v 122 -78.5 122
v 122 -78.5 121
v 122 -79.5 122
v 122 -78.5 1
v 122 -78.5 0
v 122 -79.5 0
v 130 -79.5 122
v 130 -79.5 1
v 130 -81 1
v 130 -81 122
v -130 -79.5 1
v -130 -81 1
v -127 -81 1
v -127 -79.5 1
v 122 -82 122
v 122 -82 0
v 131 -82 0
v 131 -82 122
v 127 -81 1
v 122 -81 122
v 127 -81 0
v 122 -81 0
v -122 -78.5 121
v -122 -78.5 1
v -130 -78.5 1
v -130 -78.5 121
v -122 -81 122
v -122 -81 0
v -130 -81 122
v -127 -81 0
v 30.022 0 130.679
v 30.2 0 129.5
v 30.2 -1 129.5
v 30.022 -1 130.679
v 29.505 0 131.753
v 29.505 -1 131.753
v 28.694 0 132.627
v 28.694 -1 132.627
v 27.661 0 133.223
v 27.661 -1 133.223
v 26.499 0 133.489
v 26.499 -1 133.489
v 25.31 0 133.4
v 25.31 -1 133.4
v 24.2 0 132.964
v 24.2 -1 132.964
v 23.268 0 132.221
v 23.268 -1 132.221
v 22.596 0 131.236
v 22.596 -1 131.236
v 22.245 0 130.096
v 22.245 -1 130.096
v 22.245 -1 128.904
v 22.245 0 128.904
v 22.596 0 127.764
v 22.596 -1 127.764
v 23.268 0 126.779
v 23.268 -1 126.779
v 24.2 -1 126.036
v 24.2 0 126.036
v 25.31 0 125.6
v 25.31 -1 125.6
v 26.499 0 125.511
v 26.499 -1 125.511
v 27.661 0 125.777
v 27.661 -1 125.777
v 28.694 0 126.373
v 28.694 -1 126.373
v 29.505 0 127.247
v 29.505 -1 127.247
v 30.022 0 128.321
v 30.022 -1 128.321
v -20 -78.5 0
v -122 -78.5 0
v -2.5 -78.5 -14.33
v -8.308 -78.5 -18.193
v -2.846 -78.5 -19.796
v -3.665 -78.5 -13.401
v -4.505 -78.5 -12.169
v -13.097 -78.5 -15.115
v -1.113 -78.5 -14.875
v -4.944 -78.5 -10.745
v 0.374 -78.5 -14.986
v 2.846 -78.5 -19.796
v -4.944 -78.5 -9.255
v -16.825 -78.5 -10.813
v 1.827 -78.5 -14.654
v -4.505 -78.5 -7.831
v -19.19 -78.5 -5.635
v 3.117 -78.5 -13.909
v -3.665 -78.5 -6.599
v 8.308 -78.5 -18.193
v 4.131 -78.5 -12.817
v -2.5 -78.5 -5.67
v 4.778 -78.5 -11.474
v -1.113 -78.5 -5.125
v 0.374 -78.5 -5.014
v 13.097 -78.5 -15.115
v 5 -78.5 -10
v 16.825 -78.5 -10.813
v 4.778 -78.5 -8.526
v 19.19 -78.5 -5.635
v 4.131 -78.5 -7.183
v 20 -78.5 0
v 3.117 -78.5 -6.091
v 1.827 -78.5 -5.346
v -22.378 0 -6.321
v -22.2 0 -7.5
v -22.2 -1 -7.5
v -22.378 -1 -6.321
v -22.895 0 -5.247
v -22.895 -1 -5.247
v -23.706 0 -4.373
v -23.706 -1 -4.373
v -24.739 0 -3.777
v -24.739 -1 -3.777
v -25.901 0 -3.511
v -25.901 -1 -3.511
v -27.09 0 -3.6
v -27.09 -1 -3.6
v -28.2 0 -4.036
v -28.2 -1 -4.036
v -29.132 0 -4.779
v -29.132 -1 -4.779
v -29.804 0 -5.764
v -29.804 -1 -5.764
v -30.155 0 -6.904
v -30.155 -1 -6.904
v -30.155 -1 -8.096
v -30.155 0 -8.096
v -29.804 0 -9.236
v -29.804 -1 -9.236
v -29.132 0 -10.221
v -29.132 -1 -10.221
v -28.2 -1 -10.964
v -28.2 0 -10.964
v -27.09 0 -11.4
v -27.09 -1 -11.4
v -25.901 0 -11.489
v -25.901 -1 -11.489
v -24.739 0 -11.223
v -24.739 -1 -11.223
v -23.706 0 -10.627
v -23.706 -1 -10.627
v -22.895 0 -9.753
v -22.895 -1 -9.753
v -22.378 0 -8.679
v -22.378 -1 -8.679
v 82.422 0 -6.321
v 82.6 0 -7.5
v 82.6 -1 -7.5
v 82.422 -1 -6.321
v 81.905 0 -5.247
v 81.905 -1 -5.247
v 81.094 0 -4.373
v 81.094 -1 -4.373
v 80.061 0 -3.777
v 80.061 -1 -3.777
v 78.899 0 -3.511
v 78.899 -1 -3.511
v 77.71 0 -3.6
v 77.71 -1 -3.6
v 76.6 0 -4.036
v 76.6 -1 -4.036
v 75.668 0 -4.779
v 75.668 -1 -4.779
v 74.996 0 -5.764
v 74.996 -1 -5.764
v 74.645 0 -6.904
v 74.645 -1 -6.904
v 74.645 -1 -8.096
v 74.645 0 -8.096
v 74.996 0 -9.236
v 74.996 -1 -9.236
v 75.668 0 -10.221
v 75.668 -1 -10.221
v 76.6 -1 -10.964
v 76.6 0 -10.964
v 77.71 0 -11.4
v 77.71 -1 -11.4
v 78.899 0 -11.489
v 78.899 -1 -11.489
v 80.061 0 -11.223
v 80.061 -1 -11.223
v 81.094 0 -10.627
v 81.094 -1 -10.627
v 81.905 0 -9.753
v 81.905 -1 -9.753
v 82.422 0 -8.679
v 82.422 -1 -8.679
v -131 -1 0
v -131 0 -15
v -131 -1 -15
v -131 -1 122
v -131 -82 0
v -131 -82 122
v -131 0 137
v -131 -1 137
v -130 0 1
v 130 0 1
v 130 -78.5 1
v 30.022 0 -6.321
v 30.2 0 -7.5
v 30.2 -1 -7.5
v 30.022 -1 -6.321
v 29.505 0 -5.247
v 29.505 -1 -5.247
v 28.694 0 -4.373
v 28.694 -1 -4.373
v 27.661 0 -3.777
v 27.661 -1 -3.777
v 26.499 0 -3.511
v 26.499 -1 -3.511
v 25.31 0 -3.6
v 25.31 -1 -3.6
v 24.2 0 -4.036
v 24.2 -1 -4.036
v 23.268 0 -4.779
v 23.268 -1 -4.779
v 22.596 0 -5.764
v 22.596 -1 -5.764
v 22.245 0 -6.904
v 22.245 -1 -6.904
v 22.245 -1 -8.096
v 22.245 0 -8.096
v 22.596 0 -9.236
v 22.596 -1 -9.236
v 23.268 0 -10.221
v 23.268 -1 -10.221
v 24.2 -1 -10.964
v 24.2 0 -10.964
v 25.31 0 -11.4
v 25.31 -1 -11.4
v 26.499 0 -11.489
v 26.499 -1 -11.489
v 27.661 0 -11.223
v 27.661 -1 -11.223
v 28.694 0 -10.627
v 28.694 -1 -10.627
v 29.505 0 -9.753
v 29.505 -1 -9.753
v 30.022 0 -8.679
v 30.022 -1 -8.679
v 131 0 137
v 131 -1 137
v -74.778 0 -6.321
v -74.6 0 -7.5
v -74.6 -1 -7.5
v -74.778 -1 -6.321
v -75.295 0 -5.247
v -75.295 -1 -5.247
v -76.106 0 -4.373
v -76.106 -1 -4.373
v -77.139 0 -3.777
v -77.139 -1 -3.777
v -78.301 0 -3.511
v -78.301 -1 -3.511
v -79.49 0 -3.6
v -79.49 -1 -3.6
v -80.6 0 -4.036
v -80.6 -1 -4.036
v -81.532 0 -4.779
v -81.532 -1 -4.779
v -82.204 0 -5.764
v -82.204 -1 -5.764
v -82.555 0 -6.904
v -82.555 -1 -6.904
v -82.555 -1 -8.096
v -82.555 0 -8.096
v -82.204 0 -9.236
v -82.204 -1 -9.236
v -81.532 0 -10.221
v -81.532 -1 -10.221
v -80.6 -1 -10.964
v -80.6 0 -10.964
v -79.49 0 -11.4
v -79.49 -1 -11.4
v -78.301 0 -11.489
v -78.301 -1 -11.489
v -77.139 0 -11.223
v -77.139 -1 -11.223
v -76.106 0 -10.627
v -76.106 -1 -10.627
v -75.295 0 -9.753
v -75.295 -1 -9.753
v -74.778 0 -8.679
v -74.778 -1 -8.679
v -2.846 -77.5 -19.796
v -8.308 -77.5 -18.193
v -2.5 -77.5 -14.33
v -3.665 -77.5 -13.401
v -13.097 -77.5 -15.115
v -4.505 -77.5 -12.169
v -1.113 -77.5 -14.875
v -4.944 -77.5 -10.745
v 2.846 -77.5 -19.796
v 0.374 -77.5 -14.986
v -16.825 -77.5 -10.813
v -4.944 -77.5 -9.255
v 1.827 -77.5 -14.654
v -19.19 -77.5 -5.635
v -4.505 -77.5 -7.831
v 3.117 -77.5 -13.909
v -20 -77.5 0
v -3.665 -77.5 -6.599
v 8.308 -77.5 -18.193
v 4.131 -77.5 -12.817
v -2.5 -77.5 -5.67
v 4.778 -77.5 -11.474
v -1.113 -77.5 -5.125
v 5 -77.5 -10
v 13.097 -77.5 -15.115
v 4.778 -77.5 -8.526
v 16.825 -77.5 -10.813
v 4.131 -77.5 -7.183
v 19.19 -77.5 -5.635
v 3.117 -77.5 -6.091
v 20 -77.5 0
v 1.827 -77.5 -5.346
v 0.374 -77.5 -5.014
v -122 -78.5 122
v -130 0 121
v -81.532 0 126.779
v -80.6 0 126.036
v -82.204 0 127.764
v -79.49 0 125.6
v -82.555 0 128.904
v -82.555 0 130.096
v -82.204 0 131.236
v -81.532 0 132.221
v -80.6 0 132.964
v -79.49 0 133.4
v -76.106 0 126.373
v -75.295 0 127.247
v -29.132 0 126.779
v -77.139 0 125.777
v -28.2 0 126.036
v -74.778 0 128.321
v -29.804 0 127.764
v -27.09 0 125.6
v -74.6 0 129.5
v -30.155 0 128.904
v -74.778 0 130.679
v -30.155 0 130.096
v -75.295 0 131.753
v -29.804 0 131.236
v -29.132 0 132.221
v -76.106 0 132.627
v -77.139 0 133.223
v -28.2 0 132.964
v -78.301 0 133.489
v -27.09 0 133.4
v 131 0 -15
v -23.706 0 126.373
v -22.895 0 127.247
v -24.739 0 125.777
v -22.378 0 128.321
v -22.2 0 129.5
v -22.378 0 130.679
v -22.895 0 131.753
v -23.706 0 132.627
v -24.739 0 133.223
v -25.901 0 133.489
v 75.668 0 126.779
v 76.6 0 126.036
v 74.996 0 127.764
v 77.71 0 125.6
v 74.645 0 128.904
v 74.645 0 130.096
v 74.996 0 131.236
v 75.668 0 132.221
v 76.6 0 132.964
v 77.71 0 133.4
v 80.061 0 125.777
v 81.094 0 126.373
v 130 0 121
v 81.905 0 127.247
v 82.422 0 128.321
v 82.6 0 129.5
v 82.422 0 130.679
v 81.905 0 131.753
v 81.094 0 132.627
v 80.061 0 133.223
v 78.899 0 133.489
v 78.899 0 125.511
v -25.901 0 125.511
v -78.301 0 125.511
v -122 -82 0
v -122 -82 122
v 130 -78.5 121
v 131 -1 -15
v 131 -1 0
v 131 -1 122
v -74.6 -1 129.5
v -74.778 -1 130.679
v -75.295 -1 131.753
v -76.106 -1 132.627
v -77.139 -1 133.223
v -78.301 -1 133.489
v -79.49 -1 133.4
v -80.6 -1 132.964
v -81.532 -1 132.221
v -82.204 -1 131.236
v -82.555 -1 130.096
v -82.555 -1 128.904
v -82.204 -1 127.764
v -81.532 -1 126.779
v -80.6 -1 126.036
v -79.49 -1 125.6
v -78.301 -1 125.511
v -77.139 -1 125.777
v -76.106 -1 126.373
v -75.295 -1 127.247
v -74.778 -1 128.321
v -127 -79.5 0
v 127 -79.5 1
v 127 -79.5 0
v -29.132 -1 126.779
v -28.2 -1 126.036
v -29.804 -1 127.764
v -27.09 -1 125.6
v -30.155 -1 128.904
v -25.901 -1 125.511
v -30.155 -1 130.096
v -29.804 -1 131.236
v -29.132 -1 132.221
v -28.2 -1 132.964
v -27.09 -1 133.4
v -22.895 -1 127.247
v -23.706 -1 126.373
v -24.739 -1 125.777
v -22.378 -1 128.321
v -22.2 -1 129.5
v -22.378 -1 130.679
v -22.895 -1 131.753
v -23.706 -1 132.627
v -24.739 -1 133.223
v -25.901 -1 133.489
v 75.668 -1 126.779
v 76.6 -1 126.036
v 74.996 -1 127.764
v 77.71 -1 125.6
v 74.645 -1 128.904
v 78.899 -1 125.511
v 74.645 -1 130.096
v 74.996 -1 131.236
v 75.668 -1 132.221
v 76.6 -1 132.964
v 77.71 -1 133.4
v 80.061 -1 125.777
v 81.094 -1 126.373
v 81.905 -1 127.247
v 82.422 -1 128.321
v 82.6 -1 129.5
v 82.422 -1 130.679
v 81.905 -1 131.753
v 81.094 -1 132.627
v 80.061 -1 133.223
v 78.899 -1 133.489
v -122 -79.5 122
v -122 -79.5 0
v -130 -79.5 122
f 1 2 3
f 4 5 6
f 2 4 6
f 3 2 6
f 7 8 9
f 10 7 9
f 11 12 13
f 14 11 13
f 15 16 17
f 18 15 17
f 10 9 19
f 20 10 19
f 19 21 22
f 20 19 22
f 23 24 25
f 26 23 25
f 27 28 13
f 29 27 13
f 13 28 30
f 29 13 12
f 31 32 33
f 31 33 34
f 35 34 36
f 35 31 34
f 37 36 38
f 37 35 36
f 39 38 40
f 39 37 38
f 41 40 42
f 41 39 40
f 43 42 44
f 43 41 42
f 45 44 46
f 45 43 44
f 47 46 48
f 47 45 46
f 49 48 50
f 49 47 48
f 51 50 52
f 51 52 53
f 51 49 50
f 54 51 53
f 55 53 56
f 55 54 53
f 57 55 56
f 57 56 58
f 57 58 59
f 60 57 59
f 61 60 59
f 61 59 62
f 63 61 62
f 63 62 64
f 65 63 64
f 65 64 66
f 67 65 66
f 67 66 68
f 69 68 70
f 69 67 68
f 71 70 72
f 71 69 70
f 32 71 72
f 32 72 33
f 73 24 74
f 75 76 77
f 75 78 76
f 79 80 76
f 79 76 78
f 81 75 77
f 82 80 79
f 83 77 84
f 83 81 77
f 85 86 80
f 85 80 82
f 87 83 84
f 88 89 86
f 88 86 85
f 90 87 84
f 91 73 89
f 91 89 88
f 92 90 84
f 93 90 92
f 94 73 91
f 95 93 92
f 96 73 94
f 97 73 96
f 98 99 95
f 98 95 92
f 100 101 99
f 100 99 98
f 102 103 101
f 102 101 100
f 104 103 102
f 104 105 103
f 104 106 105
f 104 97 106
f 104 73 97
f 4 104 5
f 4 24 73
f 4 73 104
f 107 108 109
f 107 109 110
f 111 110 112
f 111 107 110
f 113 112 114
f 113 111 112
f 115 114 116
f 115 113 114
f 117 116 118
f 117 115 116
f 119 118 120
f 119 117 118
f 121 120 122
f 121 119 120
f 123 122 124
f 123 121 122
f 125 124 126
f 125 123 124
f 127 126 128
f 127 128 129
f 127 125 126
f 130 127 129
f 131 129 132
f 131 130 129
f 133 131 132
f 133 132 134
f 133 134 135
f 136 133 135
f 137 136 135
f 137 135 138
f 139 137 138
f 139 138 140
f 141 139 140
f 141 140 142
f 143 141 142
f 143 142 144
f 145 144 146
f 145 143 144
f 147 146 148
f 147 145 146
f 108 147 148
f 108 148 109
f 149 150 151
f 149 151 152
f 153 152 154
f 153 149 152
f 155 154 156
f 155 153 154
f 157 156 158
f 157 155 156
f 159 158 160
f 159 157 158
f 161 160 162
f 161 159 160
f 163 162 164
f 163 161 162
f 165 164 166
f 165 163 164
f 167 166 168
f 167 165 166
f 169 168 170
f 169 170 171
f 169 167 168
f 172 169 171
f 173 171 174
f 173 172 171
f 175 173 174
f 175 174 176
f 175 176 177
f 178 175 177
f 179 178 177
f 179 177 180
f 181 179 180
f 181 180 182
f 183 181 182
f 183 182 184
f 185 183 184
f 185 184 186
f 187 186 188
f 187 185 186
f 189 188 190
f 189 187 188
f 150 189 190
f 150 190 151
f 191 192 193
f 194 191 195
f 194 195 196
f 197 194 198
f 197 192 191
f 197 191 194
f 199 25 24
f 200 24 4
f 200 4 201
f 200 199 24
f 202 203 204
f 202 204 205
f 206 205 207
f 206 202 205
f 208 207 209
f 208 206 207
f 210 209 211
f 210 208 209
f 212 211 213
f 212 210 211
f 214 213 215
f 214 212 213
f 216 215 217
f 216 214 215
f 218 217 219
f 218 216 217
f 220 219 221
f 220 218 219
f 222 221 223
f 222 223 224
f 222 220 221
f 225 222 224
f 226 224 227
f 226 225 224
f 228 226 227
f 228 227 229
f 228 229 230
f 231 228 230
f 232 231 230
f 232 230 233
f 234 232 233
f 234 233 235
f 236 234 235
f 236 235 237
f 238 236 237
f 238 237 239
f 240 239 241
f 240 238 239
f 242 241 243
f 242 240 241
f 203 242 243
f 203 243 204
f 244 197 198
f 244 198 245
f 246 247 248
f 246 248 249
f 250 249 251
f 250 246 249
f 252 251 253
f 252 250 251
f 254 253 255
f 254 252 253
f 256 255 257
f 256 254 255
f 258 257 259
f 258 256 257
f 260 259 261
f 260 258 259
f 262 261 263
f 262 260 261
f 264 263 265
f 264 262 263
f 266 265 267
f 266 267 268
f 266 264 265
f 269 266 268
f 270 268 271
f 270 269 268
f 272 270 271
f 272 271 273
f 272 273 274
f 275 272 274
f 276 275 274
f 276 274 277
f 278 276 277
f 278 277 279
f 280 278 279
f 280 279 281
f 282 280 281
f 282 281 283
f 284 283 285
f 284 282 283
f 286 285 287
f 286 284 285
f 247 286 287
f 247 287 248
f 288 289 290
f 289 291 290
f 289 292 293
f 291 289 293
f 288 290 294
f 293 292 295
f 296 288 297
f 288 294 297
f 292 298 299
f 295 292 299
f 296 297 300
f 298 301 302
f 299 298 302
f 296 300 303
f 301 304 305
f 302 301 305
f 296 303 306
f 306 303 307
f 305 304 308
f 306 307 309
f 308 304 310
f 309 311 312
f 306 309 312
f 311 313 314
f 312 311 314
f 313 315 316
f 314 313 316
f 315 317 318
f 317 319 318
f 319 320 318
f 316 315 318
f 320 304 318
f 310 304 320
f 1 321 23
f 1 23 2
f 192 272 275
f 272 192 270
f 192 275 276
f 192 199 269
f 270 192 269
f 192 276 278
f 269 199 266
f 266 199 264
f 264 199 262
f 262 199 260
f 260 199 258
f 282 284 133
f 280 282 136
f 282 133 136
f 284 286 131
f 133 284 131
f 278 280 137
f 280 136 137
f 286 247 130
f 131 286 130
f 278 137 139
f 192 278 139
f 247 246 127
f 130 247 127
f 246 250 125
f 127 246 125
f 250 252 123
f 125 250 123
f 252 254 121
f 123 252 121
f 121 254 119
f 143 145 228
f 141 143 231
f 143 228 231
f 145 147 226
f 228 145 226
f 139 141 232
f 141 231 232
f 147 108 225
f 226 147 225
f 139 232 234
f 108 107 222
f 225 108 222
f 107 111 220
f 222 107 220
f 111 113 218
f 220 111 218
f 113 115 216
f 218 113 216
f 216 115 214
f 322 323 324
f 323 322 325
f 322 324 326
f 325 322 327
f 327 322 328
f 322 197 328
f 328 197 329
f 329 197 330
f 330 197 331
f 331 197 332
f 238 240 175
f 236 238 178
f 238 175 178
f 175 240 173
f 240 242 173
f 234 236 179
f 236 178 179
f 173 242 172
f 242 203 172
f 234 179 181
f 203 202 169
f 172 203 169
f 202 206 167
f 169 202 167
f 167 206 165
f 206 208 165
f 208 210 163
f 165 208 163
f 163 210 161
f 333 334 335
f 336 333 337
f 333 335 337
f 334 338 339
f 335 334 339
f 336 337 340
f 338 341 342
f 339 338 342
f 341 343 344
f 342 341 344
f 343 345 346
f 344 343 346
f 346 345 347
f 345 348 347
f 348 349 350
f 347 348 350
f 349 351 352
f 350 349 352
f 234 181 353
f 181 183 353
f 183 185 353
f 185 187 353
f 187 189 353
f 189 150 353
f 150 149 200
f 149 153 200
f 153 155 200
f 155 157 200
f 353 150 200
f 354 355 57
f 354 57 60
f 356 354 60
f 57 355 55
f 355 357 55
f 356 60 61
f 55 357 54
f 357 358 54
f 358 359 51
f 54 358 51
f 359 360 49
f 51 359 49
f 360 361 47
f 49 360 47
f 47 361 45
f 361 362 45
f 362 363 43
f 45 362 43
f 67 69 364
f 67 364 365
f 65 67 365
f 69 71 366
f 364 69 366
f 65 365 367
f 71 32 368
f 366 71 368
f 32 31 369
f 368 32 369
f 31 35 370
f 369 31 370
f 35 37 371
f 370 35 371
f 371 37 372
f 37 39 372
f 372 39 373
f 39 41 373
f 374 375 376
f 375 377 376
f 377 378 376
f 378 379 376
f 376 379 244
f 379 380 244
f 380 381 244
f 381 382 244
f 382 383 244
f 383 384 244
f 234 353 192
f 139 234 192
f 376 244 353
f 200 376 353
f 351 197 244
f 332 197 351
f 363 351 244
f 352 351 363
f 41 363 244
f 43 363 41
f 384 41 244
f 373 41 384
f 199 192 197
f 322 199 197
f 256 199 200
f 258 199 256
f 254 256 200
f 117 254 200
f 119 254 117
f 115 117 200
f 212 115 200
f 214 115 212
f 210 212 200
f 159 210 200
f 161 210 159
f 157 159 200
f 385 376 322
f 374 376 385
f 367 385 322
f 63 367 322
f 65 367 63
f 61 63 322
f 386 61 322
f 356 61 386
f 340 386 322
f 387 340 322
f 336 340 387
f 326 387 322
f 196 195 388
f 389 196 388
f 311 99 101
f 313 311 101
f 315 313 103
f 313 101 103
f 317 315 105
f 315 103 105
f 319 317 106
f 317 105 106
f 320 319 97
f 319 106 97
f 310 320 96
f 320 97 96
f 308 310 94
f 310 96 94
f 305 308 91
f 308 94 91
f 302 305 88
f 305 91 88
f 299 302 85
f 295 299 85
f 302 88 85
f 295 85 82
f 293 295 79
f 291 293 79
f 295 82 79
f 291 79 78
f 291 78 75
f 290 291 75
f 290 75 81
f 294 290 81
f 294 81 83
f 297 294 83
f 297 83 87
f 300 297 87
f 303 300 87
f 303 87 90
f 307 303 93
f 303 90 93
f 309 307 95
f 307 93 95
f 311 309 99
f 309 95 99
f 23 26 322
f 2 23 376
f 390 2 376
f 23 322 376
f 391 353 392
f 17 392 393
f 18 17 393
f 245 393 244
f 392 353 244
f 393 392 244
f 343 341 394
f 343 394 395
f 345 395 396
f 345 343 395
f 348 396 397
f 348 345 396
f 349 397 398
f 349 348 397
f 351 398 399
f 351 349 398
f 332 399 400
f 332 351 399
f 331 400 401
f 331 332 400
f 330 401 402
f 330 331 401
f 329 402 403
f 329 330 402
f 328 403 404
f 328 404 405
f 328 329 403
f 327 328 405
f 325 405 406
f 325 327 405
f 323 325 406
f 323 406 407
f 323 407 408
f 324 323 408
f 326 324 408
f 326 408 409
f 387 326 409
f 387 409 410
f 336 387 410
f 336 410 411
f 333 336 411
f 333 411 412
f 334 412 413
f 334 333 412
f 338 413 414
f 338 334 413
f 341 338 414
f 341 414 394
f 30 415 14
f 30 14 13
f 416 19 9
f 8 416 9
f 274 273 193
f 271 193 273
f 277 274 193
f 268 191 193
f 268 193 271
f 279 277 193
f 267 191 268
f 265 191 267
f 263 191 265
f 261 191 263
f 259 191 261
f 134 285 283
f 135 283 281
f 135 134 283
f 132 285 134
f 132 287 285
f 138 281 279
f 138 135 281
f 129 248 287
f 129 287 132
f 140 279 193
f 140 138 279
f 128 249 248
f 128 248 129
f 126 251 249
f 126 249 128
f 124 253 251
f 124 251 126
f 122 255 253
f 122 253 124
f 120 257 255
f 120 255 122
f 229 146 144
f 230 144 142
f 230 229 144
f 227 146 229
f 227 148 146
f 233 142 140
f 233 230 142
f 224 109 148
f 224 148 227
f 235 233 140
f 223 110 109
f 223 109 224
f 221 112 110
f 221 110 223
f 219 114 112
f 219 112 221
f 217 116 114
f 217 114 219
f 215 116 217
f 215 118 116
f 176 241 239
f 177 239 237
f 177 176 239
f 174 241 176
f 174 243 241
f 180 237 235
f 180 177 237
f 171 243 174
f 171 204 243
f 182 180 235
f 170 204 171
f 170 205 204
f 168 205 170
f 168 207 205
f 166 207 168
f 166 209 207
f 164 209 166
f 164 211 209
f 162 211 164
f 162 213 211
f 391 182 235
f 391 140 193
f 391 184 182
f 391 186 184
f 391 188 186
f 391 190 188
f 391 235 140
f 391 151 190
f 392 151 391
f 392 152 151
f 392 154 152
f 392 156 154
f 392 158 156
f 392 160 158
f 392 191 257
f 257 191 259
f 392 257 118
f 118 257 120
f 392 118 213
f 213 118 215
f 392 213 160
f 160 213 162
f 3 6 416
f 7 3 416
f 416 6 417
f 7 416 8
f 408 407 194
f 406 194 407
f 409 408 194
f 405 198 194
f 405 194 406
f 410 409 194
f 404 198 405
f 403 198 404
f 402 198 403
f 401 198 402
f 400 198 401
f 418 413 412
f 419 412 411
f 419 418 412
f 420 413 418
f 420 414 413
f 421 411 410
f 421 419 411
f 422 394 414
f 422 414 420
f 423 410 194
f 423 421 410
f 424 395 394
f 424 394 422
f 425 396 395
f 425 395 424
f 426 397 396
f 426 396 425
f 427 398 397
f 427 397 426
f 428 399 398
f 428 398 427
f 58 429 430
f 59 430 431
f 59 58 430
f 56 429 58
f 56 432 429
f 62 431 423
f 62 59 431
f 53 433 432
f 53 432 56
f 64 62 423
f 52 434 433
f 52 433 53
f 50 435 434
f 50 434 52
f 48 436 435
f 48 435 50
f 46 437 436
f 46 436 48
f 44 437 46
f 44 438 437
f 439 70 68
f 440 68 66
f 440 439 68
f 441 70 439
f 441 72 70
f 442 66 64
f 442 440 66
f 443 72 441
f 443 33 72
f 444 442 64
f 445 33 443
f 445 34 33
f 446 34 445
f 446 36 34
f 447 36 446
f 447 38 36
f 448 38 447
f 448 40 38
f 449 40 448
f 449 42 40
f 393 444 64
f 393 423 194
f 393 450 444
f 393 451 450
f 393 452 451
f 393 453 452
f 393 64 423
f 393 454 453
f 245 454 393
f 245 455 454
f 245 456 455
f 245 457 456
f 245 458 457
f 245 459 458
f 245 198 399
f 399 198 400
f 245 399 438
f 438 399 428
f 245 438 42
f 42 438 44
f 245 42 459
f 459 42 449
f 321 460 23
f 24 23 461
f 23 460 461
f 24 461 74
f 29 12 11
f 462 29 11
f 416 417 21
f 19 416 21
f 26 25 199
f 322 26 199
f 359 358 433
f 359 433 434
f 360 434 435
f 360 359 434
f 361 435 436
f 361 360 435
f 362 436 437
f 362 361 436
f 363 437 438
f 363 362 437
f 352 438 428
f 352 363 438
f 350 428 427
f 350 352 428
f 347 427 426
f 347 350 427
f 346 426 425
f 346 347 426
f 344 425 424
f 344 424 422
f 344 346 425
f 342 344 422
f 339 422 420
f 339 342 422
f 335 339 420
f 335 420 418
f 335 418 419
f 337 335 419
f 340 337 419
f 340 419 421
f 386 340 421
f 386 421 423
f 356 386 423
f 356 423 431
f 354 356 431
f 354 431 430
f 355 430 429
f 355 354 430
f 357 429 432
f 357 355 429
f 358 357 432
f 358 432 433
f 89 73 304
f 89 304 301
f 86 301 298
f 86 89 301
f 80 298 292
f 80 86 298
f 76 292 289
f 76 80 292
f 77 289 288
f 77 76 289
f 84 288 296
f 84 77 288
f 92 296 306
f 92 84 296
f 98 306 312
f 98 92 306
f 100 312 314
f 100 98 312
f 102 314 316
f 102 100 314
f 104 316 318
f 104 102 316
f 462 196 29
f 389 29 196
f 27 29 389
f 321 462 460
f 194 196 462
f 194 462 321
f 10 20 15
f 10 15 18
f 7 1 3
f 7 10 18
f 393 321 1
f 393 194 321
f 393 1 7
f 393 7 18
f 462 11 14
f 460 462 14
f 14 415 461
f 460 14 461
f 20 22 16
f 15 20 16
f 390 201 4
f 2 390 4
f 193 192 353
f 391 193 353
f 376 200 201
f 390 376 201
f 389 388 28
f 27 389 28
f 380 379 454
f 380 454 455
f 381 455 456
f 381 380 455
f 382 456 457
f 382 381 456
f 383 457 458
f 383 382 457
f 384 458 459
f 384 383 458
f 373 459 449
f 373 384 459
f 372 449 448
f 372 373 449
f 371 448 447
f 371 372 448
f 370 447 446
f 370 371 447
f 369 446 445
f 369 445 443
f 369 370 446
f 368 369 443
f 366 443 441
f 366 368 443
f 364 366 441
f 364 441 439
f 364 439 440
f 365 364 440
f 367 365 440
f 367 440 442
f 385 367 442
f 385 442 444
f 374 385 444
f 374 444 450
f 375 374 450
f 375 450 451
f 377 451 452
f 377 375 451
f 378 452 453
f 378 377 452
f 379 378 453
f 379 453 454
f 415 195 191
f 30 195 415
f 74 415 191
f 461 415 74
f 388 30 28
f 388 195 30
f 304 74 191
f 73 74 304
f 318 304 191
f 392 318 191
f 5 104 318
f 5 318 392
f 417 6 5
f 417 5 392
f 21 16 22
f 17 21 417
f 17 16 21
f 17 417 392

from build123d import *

# Parameters (mm, degrees)
F1_DEPTH = 122
F2_W     = 260
F2_H     = 1
F3_DEPTH = 78.5
F4_W     = 3
F4_H     = 1.5
F5_DEPTH = 1
F6_W     = 262
F6_H     = 15
F6_R     = 4
F7_DEPTH = 1
F8_R     = 5
F9_DEPTH = 1


with BuildPart() as f1:
    # F0 (on Top) → F1 (new body)
    with BuildSketch(Plane.XY):
        Polygon((-130, 0), (-131, 0), (-131, -82), (-122, -82), (-122, -81), (-130, -81), (-130, -79.5), (-122, -79.5), (-122, -78.5), (-130, -78.5), align=None)
    extrude(amount=F1_DEPTH)



with BuildPart() as f1b:
    # F0 (on Top) → F1, piece 2 (new body)
    with BuildSketch(Plane.XY):
        Polygon((131, -82), (131, 0), (130, 0), (130, -78.5), (122, -78.5), (122, -79.5), (130, -79.5), (130, -81), (122, -81), (122, -82), align=None)
    extrude(amount=F1_DEPTH)


with BuildPart() as f1_1:
    add(f1.part)

    add(f1b.part)  # F3 merges F1b
    # F2 (on Front) → F3 (join)
    with BuildSketch(Plane.XZ):
        with Locations((0, 0.5)):
            Rectangle(F2_W, F2_H)
        with Locations((0, 121.5)):
            Rectangle(F2_W, F2_H)
    extrude(amount=F3_DEPTH)

    # F4 (on face) → F5 (join)
    with BuildSketch(Plane(origin=(0, 0, 0), x_dir=(1, 0, 0), z_dir=(0, 0, -1))):
        with Locations((-128.5, 80.25)):
            Rectangle(F4_W, F4_H)
        with Locations((128.5, 80.25)):
            Rectangle(F4_W, F4_H)
    extrude(amount=-F5_DEPTH)

    # F6 (on Front) → F7 (join)
    with BuildSketch(Plane.XZ):
        with Locations((0, -7.5)):
            Rectangle(F6_W, F6_H)
        with Locations((-78.6, -7.5)):
            Circle(F6_R, mode=Mode.SUBTRACT)
        with Locations((-26.2, -7.5)):
            Circle(F6_R, mode=Mode.SUBTRACT)
        with Locations((26.2, -7.5)):
            Circle(F6_R, mode=Mode.SUBTRACT)
        with Locations((78.6, -7.5)):
            Circle(F6_R, mode=Mode.SUBTRACT)
        with Locations((0, 129.5)):
            Rectangle(F6_W, F6_H)
        with Locations((-78.6, 129.5)):
            Circle(F6_R, mode=Mode.SUBTRACT)
        with Locations((-26.2, 129.5)):
            Circle(F6_R, mode=Mode.SUBTRACT)
        with Locations((26.2, 129.5)):
            Circle(F6_R, mode=Mode.SUBTRACT)
        with Locations((78.6, 129.5)):
            Circle(F6_R, mode=Mode.SUBTRACT)
    extrude(amount=F7_DEPTH)

    # F8 (on face) → F9 (join)
    with BuildSketch(Plane.XZ.offset(78.5)):
        with BuildLine():
            Line((20, 0), (-20, 0))
            ThreePointArc((-20, 0), (0, -20), (20, 0))
        make_face()
        with Locations((0, -10)):
            Circle(F8_R, mode=Mode.SUBTRACT)
    extrude(amount=-F9_DEPTH)


solid = f1_1.part
